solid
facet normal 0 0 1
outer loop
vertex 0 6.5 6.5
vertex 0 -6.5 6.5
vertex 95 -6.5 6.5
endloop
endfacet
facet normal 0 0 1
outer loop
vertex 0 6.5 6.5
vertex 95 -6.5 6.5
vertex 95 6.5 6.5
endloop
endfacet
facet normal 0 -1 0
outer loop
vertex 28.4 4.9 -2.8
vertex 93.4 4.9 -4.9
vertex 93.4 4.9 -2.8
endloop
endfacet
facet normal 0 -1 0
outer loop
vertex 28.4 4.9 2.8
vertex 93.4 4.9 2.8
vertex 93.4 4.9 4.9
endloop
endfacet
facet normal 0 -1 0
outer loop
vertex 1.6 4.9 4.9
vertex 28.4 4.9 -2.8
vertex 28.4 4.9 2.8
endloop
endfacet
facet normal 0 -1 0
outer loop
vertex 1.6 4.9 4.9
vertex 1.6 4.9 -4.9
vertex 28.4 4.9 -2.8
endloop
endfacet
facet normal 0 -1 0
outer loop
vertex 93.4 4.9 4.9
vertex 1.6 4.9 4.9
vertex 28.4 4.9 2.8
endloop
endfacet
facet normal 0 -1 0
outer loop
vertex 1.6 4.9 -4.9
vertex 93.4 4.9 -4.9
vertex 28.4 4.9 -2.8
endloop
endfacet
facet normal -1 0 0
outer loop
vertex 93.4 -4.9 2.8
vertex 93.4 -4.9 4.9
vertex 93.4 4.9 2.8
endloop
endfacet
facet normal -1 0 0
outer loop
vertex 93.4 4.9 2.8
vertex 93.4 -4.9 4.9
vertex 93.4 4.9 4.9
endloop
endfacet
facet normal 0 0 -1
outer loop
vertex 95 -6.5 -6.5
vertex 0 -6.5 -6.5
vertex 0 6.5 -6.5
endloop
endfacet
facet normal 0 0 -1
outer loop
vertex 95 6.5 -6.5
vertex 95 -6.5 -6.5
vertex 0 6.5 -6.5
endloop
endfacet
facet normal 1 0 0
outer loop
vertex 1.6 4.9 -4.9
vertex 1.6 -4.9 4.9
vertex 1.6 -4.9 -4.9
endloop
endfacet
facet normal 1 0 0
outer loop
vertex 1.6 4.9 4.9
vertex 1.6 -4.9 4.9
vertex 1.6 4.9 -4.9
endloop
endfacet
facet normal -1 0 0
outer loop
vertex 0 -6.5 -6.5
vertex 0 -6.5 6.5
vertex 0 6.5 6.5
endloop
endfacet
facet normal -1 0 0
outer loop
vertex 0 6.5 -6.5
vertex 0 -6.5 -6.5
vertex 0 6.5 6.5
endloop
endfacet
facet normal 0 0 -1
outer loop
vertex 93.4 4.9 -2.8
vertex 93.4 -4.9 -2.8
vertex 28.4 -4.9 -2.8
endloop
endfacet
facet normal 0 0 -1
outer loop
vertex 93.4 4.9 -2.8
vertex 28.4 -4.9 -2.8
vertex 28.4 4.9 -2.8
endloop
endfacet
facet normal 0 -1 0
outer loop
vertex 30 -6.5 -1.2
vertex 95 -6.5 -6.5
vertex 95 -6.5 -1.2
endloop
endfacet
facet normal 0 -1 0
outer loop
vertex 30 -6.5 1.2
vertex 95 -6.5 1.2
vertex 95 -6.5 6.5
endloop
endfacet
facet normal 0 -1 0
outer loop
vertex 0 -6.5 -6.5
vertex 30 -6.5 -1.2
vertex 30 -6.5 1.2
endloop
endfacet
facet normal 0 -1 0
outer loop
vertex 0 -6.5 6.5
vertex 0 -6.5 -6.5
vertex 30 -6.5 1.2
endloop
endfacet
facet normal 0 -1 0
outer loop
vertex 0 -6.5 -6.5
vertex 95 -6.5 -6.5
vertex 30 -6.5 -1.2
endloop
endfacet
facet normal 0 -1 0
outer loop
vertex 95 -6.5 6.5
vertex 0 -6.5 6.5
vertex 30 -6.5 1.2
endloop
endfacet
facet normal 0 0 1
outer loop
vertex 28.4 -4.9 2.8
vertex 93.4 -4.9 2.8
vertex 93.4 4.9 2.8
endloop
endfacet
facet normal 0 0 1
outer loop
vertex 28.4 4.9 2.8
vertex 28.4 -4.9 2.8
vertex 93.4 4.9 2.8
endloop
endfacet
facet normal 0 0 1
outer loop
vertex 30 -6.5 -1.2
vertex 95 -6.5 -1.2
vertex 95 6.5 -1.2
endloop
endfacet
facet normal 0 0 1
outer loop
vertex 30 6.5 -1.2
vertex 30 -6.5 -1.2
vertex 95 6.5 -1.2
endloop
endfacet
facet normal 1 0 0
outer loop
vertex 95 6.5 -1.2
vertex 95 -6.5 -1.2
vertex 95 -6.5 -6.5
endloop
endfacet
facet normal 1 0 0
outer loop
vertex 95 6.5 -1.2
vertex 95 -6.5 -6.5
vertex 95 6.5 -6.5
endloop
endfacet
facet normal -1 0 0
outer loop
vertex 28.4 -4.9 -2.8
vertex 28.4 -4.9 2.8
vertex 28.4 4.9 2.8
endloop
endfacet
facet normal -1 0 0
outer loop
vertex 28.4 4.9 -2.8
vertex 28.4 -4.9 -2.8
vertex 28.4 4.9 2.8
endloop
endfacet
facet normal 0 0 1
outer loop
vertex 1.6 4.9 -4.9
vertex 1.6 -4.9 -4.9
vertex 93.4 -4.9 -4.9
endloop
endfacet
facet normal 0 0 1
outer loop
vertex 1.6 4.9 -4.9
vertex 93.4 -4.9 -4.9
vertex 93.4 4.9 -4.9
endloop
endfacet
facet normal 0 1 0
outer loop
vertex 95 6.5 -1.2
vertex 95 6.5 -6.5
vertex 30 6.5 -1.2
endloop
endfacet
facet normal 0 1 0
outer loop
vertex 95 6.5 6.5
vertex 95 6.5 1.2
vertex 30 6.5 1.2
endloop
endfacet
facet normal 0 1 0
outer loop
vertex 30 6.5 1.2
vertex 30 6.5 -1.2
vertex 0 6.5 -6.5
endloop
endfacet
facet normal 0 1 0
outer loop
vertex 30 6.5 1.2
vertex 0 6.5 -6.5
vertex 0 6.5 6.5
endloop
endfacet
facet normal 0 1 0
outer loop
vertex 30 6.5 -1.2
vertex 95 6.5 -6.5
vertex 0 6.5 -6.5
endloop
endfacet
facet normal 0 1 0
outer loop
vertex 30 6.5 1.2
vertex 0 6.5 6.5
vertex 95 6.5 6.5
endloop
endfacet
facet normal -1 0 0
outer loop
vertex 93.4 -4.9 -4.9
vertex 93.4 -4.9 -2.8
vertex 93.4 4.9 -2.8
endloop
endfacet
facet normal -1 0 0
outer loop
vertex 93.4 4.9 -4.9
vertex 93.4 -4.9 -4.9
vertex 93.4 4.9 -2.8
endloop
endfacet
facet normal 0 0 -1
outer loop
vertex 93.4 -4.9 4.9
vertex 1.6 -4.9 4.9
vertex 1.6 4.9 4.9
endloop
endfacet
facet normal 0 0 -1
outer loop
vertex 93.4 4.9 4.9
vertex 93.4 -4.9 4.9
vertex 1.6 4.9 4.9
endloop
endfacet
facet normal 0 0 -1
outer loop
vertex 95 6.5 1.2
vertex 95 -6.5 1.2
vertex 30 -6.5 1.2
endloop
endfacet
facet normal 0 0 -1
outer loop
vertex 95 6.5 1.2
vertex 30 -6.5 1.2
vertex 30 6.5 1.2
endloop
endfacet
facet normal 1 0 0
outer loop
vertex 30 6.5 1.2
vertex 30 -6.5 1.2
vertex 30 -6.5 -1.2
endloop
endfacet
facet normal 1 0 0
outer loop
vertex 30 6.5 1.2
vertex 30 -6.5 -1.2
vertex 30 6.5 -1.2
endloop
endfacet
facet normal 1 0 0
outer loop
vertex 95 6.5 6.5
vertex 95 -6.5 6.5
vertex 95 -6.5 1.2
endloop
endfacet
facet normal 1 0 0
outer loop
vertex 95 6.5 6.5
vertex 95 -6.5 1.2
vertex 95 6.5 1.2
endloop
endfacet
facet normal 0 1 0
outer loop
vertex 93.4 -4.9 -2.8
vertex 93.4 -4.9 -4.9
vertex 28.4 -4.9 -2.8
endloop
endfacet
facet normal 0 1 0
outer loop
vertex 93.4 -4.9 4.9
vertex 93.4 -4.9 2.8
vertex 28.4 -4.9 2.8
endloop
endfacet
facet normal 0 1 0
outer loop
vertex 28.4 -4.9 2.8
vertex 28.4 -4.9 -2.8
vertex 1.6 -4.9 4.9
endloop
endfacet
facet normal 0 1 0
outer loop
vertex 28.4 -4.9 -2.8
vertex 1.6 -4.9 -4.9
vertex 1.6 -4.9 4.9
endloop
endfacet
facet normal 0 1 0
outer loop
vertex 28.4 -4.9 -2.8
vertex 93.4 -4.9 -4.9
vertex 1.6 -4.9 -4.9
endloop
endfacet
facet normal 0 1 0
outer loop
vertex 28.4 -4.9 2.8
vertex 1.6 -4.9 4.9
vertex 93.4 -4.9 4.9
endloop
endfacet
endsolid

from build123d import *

# Parameters (mm, degrees)
F0_W     = 13
F0_H     = 13
F1_DEPTH = 95
F3_W     = 13
F3_H     = 2.4
F4_DEPTH = 80
F5_T     = -1.6


with BuildPart() as f1:
    # F0 (on Right) → F1 (new body)
    with BuildSketch(Plane.YZ):
        Rectangle(F0_W, F0_H)
    extrude(amount=F1_DEPTH)

    # F3 (on offset) → F4 (cut)
    with BuildSketch(Plane.YZ.offset(110)):
        Rectangle(F3_W, F3_H)
    extrude(amount=-F4_DEPTH, mode=Mode.SUBTRACT)

    # F5 (hollow: no face is removed)
    offset(amount=F5_T, kind=Kind.INTERSECTION, mode=Mode.SUBTRACT)


solid = f1.part
